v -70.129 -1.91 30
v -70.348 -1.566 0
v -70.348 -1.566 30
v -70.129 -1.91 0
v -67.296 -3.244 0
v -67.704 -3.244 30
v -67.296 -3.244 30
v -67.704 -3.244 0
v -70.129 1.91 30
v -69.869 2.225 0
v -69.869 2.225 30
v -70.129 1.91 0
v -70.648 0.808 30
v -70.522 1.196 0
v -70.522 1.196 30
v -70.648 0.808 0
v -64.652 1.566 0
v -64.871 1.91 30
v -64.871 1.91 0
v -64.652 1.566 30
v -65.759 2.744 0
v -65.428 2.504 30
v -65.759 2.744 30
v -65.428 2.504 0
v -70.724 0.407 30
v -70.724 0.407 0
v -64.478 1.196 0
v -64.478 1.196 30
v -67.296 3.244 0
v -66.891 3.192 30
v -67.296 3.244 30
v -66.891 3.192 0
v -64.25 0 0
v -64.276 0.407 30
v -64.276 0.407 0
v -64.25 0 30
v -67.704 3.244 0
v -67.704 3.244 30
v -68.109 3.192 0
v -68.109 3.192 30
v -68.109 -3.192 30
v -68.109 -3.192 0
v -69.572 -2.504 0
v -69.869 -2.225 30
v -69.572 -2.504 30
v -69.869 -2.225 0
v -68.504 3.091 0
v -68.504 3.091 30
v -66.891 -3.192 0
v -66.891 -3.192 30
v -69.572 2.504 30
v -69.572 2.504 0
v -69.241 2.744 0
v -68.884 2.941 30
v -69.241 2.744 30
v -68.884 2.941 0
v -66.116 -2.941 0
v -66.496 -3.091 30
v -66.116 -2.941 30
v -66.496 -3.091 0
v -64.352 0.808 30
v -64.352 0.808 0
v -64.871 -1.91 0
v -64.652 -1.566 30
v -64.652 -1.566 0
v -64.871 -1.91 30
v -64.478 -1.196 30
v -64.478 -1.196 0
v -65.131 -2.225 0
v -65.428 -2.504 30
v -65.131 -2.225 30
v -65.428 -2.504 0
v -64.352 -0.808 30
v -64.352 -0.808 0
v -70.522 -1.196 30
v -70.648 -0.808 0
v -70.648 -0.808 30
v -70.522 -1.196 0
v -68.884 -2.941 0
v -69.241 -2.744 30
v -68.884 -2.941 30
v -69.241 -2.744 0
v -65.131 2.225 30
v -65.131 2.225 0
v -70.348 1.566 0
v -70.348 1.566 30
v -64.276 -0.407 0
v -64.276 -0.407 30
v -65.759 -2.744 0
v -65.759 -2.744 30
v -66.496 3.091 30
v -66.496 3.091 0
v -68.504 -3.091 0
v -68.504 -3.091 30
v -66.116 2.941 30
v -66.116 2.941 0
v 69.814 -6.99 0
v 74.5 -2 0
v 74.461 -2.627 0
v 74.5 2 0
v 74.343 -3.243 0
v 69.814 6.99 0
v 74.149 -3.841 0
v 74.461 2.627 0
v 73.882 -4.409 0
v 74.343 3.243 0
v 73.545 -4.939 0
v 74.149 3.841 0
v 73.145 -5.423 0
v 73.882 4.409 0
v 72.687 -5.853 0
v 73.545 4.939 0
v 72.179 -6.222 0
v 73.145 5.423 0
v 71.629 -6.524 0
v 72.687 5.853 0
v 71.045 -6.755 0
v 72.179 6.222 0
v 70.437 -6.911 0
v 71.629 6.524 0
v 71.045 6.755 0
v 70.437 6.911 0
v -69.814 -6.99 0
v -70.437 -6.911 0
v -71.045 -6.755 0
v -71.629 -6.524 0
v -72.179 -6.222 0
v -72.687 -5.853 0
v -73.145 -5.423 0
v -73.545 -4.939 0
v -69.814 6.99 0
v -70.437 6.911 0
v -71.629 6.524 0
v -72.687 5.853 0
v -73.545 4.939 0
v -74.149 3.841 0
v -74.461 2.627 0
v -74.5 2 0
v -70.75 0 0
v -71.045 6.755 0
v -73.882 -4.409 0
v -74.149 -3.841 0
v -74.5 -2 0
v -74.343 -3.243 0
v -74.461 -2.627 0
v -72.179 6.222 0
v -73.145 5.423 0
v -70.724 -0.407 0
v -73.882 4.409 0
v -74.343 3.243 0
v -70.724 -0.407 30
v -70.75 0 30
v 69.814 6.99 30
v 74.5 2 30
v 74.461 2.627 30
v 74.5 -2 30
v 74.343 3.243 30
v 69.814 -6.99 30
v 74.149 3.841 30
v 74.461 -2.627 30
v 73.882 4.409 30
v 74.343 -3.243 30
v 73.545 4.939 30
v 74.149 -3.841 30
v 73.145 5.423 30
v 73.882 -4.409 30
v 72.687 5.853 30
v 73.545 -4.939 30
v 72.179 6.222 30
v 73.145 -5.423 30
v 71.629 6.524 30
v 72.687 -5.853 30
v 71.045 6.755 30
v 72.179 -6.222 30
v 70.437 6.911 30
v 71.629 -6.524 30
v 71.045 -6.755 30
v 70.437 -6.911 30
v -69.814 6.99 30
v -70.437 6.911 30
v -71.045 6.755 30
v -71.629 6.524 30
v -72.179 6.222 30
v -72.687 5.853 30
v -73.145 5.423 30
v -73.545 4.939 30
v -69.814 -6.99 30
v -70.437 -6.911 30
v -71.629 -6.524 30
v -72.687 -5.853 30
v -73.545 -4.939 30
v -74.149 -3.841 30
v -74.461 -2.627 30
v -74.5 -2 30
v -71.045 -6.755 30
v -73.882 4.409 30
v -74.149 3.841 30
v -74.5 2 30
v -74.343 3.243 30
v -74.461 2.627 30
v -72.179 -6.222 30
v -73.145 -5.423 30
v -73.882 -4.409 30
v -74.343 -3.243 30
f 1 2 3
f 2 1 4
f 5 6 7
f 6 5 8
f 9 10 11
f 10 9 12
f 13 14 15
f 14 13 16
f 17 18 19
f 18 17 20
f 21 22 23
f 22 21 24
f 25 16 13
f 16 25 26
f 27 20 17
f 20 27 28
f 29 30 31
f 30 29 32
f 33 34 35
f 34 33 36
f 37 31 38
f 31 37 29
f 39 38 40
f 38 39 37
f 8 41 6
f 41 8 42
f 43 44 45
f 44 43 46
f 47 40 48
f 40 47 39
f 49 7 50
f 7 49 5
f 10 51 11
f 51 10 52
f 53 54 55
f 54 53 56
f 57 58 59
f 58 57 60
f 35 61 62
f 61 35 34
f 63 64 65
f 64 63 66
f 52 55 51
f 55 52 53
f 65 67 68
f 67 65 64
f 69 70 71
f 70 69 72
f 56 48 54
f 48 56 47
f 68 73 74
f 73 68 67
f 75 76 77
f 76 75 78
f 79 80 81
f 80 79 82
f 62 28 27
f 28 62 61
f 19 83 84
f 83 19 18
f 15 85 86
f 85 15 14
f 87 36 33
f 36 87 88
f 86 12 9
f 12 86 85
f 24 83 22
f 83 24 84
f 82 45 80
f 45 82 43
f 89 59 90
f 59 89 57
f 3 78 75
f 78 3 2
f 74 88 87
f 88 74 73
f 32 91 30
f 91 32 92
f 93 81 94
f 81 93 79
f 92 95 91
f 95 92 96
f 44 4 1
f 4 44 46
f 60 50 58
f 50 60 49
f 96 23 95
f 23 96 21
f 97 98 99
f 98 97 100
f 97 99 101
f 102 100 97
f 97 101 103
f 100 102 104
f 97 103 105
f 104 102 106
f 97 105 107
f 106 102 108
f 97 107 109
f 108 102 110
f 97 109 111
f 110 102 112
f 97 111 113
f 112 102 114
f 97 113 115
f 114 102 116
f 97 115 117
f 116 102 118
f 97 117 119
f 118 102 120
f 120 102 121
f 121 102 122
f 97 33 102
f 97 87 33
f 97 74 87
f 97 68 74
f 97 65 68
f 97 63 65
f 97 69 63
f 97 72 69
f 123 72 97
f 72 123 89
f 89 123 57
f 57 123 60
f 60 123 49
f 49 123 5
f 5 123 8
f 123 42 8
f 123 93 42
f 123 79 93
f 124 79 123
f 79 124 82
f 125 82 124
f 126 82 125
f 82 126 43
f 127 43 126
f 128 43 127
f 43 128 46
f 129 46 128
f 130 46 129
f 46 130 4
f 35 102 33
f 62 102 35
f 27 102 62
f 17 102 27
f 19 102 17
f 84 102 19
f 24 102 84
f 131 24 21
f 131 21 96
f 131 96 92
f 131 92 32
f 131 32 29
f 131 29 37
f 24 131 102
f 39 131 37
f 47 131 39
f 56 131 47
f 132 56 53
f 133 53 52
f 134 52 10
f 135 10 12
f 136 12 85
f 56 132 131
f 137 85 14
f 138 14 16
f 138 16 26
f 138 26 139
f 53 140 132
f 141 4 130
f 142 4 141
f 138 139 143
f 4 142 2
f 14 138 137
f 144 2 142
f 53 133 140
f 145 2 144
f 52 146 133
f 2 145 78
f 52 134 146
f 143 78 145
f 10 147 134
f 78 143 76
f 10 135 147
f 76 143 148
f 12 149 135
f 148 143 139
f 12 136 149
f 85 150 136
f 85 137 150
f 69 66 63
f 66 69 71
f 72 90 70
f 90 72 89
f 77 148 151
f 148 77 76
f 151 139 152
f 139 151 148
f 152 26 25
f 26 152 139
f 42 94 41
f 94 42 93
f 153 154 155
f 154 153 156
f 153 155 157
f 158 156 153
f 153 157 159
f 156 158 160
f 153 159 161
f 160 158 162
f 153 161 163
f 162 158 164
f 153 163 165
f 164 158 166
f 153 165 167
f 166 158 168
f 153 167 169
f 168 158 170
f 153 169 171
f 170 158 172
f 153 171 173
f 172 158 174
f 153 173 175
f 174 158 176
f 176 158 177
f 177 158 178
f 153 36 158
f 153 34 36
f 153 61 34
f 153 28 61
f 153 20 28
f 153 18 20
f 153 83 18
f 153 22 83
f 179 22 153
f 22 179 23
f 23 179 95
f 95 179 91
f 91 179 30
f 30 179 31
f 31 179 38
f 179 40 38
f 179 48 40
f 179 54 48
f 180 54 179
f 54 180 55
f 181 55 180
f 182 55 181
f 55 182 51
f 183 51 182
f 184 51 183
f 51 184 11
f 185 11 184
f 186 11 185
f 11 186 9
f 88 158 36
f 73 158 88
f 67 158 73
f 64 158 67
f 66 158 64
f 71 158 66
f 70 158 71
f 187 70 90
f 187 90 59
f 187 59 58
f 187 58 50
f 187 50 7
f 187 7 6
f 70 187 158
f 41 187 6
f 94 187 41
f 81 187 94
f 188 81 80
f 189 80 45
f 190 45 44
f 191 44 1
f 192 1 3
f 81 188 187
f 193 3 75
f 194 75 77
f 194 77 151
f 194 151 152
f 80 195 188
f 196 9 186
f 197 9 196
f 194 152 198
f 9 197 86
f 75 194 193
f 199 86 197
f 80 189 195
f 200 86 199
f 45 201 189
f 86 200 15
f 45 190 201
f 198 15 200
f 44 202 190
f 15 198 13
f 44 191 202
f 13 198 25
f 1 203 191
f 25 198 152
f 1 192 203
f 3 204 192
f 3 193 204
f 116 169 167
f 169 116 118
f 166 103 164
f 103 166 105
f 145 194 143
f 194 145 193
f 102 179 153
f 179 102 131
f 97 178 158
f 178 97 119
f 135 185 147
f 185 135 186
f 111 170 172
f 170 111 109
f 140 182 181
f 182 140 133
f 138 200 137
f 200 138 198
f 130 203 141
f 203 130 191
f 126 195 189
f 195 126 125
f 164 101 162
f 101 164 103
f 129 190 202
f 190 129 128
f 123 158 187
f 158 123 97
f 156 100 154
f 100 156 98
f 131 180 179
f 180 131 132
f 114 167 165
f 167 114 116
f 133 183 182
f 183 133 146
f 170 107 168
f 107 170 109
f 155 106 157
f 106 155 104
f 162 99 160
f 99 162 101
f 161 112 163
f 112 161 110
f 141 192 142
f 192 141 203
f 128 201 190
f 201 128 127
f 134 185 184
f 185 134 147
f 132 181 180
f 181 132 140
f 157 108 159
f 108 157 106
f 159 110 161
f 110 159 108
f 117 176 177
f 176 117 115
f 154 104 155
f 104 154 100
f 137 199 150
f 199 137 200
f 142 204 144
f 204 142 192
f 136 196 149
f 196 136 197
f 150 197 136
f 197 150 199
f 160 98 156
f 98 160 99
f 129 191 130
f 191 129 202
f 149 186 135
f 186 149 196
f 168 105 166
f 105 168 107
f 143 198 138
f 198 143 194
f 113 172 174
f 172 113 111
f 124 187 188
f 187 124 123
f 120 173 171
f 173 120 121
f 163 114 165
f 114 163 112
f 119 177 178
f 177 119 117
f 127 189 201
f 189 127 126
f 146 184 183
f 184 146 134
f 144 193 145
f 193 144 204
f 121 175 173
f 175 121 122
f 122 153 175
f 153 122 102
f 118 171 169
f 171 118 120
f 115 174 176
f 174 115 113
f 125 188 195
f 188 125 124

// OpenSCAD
$fn = 50;


difference() {
	union() {
		hull() {
			translate(v = [-69.5000000000, 2.0000000000, 0]) {
				cylinder(h = 30, r = 5);
			}
			translate(v = [69.5000000000, 2.0000000000, 0]) {
				cylinder(h = 30, r = 5);
			}
			translate(v = [-69.5000000000, -2.0000000000, 0]) {
				cylinder(h = 30, r = 5);
			}
			translate(v = [69.5000000000, -2.0000000000, 0]) {
				cylinder(h = 30, r = 5);
			}
		}
	}
	union() {
		translate(v = [-67.5000000000, 0.0000000000, 0]) {
			cylinder(h = 30, r = 3.2500000000);
		}
		translate(v = [-67.5000000000, 0.0000000000, 0]) {
			cylinder(h = 30, r = 1.8000000000);
		}
		translate(v = [-67.5000000000, 0.0000000000, 0]) {
			cylinder(h = 30, r = 1.8000000000);
		}
		translate(v = [-67.5000000000, 0.0000000000, 0]) {
			cylinder(h = 30, r = 1.8000000000);
		}
	}
}
